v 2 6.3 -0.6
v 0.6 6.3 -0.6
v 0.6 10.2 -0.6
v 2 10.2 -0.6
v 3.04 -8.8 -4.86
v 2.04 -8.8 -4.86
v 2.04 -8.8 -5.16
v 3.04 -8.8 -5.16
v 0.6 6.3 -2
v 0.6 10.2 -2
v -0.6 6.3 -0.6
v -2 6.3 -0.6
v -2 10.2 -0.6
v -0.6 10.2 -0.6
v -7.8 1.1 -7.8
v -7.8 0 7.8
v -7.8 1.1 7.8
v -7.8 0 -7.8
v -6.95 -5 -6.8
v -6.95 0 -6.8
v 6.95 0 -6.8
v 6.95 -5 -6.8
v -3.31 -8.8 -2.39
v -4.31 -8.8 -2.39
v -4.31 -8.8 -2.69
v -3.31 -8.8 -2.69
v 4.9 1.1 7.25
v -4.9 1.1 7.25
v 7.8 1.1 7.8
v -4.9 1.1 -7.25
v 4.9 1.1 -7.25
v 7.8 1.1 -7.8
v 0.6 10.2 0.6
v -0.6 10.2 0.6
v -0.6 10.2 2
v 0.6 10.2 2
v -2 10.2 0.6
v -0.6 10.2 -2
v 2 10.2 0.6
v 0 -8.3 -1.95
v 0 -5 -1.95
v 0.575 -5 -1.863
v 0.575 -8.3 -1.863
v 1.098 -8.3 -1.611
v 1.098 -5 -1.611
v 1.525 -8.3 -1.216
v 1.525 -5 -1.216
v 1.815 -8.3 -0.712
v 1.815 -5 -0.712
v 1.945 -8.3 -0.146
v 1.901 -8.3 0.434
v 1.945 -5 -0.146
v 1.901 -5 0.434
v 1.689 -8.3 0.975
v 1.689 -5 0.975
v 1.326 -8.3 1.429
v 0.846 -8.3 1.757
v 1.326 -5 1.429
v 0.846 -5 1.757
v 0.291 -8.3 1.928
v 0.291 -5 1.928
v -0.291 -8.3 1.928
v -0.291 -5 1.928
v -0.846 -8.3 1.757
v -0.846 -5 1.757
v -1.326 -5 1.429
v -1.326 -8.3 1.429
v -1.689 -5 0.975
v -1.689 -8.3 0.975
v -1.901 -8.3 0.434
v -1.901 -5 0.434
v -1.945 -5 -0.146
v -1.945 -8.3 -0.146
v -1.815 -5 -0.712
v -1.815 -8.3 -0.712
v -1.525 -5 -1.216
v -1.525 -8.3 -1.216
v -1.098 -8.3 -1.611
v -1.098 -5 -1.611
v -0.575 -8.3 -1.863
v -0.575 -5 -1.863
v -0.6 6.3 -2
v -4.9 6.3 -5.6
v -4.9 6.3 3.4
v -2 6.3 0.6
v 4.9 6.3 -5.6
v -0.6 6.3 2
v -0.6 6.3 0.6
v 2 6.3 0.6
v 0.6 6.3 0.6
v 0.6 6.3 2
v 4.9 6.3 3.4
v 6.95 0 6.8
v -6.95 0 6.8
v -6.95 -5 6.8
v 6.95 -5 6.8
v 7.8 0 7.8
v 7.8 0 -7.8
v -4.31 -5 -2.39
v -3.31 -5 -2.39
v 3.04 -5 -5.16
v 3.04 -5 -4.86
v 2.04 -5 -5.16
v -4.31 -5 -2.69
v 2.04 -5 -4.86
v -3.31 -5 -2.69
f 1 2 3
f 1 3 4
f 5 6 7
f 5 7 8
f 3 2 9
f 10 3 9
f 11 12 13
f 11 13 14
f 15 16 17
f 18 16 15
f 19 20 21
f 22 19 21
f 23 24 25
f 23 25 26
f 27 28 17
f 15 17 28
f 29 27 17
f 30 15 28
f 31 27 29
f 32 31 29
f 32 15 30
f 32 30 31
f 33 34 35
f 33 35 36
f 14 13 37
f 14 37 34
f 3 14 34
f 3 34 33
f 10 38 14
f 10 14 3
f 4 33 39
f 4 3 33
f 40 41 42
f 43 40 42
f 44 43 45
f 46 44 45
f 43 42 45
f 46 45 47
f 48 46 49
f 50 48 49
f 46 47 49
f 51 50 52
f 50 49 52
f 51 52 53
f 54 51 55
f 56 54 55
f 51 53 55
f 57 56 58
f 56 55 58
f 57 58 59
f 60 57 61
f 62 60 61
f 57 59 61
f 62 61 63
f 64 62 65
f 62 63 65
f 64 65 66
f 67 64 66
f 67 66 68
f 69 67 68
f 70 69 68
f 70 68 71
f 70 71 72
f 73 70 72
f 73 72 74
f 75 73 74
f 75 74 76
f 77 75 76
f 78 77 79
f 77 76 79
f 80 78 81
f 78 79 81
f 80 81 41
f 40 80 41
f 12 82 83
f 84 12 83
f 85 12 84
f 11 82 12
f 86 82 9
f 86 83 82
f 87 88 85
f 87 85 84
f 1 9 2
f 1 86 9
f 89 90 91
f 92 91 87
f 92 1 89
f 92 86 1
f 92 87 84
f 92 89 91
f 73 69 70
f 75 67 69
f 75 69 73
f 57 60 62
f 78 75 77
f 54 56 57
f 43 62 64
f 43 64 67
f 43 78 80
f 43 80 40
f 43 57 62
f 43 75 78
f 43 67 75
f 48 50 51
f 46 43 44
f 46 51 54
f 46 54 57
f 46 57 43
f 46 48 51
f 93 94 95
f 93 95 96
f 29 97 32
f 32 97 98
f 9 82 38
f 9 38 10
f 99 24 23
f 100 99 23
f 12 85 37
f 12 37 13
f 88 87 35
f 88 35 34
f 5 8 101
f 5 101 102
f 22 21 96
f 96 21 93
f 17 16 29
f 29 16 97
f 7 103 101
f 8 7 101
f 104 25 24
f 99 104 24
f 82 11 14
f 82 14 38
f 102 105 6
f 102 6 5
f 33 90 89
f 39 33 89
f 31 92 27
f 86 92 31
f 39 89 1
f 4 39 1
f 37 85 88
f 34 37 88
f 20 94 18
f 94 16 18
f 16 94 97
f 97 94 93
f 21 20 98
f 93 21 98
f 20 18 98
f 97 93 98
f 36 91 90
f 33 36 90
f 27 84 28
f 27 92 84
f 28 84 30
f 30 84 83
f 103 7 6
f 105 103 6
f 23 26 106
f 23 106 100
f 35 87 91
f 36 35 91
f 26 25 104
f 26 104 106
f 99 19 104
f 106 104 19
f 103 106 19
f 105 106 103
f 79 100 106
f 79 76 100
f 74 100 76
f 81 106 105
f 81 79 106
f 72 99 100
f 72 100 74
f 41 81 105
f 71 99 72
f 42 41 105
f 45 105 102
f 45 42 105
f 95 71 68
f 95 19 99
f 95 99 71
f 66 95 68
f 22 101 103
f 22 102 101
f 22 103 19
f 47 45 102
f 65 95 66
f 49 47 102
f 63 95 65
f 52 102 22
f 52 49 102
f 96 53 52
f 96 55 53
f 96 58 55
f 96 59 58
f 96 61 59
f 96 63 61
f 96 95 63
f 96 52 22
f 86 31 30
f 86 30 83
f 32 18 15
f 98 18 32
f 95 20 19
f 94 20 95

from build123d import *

# Parameters (mm, degrees)
SKETCH_4_W      = 15.6
SKETCH_4_H      = 15.6
EXTRUDE_1_DEPTH = 1.1
EXTRUDE_2_DEPTH = 4.9
SKETCH_7_W      = 13.9
SKETCH_7_H      = 13.6
EXTRUDE_4_DEPTH = 5
SKETCH_6_R      = 1.95
EXTRUDE_3_DEPTH = 3.3
SKETCH_8_W      = 1.2
SKETCH_8_H      = 4
SKETCH_8_W_2    = 4
SKETCH_8_H_2    = 1.2
EXTRUDE_5_DEPTH = 3.9
SKETCH_9_W      = 1
SKETCH_9_H      = 0.3
EXTRUDE_6_DEPTH = 3.8


with BuildPart() as part:
    # 草图4 → 凸台-拉伸1 (new body)
    with BuildSketch(Plane(origin=(0, 0, 0), x_dir=(1, 0, 0), z_dir=(0, 1, 0))):
        Rectangle(SKETCH_4_W, SKETCH_4_H)
    extrude(amount=EXTRUDE_1_DEPTH)

    # 草图5 → 凸台-拉伸2 (add, symmetric)
    with BuildSketch(Plane(origin=(0, 0, 0), x_dir=(0, 0, -1), z_dir=(1, 0, 0))):
        Polygon((-7.25, 1.1), (7.25, 1.1), (5.6, 6.3), (-3.4, 6.3), align=None)
    extrude(amount=EXTRUDE_2_DEPTH, both=True)

    # 草图7 → 凸台-拉伸4 (add)
    with BuildSketch(Plane.XZ):
        Rectangle(SKETCH_7_W, SKETCH_7_H)
    extrude(amount=EXTRUDE_4_DEPTH)

    # 草图6 → 凸台-拉伸3 (add)
    with BuildSketch(Plane.XZ.offset(5)):
        with Locations(Location((0, 0, 0), (0, 0, 270))):
            Circle(SKETCH_6_R)
    extrude(amount=EXTRUDE_3_DEPTH)

    # 草图8 → 凸台-拉伸5 (add)
    with BuildSketch(Plane(origin=(0, 6.3, 0), x_dir=(1, 0, 0), z_dir=(0, 1, 0))):
        Rectangle(SKETCH_8_W, SKETCH_8_H)
        Rectangle(SKETCH_8_W_2, SKETCH_8_H_2)
    extrude(amount=EXTRUDE_5_DEPTH)

    # 草图9 → 凸台-拉伸6 (add)
    with BuildSketch(Plane.XZ.offset(5)):
        with Locations((2.54, -5.01)):
            Rectangle(SKETCH_9_W, SKETCH_9_H)
        with Locations((-3.81, -2.54)):
            Rectangle(SKETCH_9_W, SKETCH_9_H)
    extrude(amount=EXTRUDE_6_DEPTH)


solid = part.part
